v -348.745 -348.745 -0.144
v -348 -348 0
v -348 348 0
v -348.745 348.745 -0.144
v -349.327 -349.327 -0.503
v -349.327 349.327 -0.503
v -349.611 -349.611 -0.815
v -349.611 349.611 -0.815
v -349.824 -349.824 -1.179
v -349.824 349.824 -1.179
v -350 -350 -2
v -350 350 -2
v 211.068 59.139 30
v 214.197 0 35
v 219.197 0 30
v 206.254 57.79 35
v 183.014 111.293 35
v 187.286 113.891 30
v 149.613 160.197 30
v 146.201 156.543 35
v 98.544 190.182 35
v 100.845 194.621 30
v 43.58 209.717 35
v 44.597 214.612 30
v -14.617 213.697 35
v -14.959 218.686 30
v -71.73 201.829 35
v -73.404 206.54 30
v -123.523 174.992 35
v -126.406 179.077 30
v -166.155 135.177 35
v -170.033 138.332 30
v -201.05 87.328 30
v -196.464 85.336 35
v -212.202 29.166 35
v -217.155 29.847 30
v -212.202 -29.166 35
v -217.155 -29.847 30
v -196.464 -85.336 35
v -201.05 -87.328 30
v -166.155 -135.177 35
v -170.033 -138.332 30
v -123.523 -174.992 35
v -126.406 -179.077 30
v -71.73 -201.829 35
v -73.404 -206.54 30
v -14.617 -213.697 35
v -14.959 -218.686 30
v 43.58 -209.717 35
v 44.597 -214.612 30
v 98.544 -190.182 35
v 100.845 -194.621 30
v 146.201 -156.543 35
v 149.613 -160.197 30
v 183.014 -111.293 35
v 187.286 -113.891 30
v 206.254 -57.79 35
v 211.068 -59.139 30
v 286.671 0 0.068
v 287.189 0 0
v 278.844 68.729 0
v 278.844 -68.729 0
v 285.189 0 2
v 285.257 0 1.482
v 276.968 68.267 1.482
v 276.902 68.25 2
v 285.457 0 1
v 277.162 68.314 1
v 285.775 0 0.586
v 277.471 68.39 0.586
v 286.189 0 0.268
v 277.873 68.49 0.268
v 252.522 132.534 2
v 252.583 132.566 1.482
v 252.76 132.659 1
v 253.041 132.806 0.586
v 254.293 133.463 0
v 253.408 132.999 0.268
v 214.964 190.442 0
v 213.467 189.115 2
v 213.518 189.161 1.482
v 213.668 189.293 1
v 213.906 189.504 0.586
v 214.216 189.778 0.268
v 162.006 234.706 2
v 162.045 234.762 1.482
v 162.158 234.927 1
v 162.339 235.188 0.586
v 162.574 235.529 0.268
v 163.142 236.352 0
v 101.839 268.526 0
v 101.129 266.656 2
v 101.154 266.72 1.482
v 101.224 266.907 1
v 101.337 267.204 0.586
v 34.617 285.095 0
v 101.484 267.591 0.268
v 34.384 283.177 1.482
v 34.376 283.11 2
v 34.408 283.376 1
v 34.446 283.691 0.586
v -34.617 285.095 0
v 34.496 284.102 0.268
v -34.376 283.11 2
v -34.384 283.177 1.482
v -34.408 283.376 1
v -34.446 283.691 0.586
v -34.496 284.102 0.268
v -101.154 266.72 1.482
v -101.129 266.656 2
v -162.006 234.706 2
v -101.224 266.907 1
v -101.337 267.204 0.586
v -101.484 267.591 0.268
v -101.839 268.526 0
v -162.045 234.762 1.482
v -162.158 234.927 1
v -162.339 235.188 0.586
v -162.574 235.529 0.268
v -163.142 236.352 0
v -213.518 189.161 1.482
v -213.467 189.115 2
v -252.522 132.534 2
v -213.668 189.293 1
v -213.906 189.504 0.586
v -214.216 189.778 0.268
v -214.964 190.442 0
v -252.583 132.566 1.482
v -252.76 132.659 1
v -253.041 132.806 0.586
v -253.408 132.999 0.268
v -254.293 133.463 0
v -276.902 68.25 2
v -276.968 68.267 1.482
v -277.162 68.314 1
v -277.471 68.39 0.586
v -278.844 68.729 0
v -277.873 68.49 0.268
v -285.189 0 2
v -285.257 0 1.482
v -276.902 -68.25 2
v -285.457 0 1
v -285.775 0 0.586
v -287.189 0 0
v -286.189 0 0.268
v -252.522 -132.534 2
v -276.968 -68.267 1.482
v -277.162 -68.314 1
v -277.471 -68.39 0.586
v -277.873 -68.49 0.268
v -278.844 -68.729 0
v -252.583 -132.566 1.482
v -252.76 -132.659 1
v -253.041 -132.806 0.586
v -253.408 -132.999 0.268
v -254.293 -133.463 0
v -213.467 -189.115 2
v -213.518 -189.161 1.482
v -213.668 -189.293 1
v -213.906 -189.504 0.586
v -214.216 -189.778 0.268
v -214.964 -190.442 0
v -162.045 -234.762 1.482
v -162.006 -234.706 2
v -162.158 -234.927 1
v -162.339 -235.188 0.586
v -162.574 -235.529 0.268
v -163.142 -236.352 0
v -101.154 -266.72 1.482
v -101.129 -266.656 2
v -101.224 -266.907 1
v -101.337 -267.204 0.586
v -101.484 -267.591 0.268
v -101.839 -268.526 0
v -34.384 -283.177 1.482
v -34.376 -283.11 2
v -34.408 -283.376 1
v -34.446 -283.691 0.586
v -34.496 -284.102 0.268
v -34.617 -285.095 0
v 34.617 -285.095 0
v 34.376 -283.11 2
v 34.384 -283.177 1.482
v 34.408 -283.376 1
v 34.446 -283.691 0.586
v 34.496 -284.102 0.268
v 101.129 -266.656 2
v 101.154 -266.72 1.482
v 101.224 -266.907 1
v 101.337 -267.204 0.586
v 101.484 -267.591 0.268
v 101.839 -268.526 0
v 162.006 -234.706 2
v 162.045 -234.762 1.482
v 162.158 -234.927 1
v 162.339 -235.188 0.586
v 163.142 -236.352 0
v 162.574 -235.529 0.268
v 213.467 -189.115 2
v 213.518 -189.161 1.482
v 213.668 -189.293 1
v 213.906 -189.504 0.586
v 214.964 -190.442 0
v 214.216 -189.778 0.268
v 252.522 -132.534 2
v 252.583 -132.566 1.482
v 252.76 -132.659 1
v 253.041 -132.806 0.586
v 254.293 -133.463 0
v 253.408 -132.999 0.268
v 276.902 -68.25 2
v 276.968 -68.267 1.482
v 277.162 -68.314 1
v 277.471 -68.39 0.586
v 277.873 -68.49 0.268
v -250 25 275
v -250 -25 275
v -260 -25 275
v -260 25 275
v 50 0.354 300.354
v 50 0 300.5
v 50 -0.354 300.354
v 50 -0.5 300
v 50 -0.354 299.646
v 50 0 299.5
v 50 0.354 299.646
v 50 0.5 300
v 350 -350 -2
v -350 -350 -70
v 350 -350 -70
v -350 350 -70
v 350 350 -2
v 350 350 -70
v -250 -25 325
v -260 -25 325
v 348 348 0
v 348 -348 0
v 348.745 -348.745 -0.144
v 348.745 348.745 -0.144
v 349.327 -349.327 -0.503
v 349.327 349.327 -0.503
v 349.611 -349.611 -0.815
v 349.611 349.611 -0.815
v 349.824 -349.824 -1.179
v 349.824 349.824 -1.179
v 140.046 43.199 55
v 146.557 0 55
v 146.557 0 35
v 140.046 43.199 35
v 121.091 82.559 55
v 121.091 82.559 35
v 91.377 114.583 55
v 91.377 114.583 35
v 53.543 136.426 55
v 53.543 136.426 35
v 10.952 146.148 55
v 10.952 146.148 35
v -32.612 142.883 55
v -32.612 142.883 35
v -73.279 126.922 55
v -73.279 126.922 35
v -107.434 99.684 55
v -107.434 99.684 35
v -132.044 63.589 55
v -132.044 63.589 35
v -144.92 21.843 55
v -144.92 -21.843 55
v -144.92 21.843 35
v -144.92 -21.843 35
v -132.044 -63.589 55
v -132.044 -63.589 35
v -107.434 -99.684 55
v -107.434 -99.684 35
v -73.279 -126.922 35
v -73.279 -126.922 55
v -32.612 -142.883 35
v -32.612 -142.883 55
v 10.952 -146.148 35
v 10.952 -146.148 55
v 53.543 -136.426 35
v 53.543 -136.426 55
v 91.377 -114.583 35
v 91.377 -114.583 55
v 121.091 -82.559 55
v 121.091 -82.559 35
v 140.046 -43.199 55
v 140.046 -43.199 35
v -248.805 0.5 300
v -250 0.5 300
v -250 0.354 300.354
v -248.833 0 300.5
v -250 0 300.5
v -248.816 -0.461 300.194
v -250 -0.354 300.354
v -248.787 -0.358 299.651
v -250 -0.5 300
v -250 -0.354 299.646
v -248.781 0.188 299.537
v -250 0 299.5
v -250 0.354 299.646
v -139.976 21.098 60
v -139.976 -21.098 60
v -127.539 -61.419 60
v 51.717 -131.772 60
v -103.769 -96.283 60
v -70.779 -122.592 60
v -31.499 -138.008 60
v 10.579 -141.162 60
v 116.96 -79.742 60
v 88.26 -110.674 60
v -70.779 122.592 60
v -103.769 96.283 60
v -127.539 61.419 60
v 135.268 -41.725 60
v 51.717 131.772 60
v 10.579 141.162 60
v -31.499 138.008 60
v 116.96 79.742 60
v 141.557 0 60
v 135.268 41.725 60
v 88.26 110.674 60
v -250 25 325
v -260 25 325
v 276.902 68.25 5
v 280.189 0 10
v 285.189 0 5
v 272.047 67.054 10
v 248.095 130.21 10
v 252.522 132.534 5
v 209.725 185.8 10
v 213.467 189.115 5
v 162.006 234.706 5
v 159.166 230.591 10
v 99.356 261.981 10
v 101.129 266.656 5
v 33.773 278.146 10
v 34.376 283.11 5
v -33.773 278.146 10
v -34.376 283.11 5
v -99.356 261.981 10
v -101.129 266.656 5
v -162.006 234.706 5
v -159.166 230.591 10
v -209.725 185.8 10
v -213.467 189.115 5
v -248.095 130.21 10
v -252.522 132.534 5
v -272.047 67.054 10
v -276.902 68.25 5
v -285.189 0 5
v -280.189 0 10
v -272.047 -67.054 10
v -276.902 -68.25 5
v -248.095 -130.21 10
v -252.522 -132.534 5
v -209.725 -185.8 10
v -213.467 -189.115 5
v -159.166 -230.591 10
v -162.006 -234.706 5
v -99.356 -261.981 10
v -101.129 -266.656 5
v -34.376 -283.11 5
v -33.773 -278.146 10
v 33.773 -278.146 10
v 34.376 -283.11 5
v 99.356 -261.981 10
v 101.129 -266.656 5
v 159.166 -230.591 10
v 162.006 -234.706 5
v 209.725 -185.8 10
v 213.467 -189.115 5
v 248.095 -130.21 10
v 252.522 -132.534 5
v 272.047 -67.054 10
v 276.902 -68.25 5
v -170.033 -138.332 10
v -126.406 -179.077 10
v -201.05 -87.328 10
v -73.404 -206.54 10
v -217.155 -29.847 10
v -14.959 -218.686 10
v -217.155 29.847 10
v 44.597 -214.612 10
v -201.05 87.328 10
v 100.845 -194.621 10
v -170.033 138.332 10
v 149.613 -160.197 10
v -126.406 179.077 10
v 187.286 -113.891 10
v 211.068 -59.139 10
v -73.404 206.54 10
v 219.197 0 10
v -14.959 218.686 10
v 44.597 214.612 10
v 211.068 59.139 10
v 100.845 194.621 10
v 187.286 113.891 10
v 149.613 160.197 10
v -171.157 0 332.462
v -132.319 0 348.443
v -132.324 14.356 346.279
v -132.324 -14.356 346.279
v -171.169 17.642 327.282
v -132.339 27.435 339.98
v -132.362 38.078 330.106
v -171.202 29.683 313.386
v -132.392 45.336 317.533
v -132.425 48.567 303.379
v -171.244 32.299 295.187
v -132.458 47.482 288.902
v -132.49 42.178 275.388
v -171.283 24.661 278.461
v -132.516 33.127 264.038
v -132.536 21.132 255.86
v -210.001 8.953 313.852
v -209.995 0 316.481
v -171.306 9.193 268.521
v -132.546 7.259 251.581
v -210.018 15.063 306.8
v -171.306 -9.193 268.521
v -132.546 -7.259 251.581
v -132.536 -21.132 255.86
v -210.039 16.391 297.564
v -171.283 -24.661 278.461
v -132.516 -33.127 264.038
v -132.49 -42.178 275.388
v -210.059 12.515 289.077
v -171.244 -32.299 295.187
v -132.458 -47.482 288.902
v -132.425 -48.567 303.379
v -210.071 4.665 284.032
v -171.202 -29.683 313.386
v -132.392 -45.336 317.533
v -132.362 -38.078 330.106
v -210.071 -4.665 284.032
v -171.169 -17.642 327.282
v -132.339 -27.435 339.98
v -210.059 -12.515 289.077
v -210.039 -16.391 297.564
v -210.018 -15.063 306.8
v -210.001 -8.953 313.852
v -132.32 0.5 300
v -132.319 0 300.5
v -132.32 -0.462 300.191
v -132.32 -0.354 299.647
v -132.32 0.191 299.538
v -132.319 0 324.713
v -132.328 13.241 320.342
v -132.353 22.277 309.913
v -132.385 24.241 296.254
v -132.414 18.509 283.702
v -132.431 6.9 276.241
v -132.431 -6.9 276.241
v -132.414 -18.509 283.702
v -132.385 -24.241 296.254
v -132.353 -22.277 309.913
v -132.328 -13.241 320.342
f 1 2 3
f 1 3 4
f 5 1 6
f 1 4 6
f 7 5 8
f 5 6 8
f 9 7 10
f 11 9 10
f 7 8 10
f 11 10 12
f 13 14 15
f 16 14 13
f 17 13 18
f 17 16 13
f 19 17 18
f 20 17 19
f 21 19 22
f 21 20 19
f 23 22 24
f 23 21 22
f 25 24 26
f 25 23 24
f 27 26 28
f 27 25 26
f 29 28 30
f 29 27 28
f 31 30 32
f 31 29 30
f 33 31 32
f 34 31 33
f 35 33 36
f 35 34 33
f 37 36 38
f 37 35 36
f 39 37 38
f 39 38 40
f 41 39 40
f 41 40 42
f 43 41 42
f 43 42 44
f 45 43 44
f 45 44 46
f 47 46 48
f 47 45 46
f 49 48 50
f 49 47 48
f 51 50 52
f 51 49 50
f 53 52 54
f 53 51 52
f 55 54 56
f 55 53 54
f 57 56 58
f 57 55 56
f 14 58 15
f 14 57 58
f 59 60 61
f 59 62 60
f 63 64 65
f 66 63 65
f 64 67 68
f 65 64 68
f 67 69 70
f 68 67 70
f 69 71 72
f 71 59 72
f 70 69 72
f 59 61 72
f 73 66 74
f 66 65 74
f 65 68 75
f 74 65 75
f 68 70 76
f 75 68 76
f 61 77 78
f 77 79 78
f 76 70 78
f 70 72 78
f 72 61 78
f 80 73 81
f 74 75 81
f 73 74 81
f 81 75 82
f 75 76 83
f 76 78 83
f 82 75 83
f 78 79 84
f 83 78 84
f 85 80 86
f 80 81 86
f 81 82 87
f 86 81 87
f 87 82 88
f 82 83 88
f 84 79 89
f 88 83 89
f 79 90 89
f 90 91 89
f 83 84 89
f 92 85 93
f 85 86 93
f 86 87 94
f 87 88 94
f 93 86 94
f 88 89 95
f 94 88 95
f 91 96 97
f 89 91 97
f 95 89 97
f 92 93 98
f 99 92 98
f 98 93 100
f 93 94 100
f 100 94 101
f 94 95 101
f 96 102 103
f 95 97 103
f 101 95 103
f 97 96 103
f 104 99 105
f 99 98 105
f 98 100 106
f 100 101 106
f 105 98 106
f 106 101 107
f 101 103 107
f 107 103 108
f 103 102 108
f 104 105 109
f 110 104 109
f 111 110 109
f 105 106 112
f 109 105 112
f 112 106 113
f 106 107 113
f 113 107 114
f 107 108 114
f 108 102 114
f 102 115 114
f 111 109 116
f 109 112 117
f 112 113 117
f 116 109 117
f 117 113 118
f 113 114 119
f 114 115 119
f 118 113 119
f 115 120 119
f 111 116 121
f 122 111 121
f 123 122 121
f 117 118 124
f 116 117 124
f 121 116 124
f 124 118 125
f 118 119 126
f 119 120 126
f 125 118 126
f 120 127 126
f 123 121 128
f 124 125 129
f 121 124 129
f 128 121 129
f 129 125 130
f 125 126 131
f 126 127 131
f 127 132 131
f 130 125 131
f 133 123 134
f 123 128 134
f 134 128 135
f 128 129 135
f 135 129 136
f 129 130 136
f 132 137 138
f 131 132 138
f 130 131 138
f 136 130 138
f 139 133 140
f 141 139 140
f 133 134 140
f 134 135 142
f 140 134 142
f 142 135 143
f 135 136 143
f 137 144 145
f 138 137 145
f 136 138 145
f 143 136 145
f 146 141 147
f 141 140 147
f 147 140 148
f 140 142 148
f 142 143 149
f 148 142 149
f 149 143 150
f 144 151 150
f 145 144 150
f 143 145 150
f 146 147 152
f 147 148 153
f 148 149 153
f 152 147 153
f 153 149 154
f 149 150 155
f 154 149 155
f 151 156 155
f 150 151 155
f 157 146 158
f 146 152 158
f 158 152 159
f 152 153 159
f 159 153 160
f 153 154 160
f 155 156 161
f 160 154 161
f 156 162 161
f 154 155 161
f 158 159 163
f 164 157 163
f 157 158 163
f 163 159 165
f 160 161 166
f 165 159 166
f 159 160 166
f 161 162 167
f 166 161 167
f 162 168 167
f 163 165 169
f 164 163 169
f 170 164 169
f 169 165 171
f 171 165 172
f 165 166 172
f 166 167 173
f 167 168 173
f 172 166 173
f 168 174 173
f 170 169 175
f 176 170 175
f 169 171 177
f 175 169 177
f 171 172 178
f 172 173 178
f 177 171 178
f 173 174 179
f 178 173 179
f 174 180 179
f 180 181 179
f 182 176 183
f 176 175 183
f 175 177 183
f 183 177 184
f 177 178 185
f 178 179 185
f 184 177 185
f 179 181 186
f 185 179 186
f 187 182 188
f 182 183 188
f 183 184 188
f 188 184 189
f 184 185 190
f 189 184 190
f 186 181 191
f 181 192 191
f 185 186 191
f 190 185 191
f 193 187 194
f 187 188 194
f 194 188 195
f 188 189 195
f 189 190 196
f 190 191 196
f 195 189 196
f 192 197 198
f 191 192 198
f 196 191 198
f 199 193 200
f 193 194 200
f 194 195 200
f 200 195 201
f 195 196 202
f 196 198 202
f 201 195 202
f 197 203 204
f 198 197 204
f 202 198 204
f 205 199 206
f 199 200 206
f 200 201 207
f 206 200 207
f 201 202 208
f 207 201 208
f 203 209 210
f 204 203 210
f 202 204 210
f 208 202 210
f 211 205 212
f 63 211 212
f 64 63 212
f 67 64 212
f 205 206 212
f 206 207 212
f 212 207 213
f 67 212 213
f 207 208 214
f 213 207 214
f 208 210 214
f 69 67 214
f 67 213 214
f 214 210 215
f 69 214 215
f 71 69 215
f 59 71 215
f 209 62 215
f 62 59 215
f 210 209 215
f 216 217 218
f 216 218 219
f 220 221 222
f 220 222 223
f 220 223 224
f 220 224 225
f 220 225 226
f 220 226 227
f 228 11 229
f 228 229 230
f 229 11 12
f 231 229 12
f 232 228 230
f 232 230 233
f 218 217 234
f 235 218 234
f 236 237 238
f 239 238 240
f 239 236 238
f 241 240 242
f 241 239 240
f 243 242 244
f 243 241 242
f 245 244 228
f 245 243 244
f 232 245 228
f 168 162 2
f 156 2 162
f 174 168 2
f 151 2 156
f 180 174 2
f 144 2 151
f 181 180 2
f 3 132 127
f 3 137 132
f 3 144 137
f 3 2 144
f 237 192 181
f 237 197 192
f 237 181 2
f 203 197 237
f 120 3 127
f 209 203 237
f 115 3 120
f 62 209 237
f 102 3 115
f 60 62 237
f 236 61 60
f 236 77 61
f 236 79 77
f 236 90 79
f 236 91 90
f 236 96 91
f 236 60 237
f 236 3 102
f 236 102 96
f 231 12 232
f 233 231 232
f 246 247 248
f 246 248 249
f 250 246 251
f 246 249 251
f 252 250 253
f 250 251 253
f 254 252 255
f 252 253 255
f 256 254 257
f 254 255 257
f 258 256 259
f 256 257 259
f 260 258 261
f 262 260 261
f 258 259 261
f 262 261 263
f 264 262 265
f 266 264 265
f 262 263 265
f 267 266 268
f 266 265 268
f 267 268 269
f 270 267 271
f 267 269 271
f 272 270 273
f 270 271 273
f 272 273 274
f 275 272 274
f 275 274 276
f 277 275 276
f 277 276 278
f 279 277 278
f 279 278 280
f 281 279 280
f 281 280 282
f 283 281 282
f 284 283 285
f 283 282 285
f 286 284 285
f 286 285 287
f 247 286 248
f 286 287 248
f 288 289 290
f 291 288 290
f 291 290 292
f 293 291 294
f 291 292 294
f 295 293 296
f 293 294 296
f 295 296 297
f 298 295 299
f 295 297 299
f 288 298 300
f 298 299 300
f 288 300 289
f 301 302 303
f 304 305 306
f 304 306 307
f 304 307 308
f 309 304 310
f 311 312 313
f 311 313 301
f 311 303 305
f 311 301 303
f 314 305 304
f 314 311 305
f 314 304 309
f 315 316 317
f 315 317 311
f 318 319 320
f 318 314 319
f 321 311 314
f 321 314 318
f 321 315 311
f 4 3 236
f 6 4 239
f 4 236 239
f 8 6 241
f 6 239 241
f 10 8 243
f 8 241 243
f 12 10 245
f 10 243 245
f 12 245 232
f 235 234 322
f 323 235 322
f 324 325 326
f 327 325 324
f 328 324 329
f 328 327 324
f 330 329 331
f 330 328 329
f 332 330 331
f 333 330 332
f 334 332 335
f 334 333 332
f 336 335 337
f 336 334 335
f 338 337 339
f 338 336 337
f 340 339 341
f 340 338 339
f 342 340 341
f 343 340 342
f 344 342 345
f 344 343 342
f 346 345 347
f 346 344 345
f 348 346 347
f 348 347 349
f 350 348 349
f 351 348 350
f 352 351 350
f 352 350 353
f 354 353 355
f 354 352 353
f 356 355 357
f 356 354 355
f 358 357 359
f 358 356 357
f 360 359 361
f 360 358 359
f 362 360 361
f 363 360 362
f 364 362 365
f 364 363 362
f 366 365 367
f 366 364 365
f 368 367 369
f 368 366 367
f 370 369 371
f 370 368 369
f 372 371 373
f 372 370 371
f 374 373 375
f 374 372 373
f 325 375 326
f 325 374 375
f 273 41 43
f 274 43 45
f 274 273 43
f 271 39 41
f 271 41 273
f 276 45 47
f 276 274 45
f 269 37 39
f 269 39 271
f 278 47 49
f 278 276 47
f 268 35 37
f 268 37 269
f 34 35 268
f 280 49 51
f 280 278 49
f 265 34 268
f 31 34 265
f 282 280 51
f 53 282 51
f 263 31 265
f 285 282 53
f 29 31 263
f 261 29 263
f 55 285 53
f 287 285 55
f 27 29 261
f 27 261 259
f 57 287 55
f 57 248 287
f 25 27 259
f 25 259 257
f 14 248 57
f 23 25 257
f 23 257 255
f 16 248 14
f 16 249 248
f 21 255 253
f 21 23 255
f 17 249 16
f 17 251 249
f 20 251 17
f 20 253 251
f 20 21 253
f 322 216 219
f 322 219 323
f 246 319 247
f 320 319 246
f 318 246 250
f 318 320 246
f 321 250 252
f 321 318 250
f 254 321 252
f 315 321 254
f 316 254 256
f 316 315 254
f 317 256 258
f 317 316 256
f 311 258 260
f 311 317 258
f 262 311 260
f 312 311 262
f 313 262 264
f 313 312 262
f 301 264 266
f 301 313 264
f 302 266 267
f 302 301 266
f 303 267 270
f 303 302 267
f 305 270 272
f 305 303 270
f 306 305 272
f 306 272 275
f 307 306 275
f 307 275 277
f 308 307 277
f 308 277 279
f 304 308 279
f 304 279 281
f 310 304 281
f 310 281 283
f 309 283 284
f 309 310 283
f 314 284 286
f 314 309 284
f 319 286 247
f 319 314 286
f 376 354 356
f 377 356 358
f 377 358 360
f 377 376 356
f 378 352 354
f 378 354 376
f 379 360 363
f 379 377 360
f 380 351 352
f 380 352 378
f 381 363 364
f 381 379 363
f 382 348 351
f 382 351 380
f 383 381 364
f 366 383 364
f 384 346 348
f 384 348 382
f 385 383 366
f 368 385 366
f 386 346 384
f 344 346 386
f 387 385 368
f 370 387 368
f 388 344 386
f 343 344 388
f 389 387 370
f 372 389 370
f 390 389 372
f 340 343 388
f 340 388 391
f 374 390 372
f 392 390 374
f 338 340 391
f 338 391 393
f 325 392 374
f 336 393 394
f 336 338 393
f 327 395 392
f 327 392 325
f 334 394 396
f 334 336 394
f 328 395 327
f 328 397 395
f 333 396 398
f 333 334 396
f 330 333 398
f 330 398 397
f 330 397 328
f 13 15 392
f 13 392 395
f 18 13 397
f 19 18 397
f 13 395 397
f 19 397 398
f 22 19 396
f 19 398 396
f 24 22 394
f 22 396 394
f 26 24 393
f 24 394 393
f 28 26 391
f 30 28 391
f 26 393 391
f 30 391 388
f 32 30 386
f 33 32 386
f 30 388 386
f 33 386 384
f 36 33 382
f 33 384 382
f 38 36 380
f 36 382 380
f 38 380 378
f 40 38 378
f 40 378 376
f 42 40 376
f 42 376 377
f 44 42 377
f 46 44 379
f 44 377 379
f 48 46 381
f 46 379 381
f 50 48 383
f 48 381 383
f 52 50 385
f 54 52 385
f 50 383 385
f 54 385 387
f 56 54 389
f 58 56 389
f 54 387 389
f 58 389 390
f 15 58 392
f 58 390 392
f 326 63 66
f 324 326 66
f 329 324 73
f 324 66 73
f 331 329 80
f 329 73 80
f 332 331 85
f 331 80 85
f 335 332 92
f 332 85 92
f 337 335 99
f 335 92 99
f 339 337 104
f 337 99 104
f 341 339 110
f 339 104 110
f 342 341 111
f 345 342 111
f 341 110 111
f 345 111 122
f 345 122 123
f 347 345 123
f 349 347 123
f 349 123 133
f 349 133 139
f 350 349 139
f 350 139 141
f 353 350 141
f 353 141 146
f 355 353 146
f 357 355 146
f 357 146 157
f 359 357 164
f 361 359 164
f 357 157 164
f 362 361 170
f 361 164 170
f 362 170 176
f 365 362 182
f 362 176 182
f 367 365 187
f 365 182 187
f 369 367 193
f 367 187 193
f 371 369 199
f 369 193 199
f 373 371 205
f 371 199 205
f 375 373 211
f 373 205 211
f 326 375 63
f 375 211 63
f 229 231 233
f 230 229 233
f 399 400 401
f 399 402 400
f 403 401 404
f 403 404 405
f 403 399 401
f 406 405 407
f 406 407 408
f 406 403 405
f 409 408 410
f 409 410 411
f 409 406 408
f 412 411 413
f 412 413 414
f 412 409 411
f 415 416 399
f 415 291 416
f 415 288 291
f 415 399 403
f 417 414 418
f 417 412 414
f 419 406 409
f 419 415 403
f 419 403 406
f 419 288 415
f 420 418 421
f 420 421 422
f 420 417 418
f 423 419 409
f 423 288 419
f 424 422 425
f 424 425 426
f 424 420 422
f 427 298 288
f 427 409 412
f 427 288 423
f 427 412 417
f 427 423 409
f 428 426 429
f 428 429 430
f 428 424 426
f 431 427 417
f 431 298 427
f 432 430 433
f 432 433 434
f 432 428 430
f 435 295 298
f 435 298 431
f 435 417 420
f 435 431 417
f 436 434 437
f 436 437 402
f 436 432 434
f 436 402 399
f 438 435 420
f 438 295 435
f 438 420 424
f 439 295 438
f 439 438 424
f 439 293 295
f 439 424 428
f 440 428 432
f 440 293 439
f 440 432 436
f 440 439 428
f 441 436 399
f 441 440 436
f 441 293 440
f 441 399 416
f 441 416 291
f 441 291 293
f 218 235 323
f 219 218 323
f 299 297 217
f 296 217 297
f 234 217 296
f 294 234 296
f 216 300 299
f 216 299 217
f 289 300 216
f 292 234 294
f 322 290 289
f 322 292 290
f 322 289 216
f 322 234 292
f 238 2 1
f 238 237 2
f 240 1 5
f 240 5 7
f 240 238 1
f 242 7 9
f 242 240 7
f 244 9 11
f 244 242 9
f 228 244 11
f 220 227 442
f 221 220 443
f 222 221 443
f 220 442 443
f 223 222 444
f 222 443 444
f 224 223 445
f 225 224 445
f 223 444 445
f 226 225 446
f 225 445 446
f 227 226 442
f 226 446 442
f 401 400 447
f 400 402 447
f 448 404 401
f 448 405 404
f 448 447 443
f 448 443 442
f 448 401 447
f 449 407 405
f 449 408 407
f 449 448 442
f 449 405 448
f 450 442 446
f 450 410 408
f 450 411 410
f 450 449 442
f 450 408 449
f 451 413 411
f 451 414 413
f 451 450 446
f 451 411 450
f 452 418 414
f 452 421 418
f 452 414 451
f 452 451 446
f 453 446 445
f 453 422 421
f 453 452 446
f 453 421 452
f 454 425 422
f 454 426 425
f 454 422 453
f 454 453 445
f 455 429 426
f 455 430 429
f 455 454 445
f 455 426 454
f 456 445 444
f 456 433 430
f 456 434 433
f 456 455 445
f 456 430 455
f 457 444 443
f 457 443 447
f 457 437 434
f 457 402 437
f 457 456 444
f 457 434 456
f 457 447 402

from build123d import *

# Parameters (mm, degrees)
F0_W      = 700
F0_H      = 700
F1_DEPTH  = 70
F2_R      = 285.1890902305
F3_DEPTH  = 10
F4_R      = 219.196638876
F5_DEPTH  = 25
F6_R      = 146.5573641712
F7_DEPTH  = 25
F9_W      = 50
F9_H      = 50
F10_DEPTH = 10
F11_R     = 0.5
F12_DEPTH = 300
F13_SIZE  = 5
F14_R     = 2


with BuildPart() as f1:
    # F0 (on Top) → F1 (new body)
    with BuildSketch(Plane.XY):
        Rectangle(F0_W, F0_H)
    extrude(amount=-F1_DEPTH)

    # F2 (on face) → F3 (join)
    with BuildSketch(Plane.XY):
        Circle(F2_R)
    extrude(amount=F3_DEPTH)

    # F4 (on face) → F5 (join)
    with BuildSketch(Plane.XY.offset(10)):
        Circle(F4_R)
    extrude(amount=F5_DEPTH)

    # F6 (on face) → F7 (join)
    with BuildSketch(Plane.XY.offset(35)):
        Circle(F6_R)
    extrude(amount=F7_DEPTH)

    # F13
    f13_edges = [f1.edges().sort_by_distance(p)[0] for p in [
        (-146.557364, 0, 60),
        (-219.196639, 0, 35),
        (-285.18909, 0, 10),
    ]]
    chamfer(f13_edges, length=F13_SIZE)

    # F14
    f14_edges = [f1.edges().sort_by_distance(p)[0] for p in [
        (0, -350, 0),
        (0, 350, 0),
        (350, 0, 0),
        (-350, 0, 0),
        (-285.18909, 0, 0),
    ]]
    fillet(f14_edges, radius=F14_R)


with BuildPart() as f10:
    # F9 (on offset) → F10 (new body)
    with BuildSketch(Plane.YZ.offset(-250)):
        with Locations((0, 300)):
            Rectangle(F9_W, F9_H)
    extrude(amount=-F10_DEPTH)

    # F11 (on face) → F12 (join)
    with BuildSketch(Plane.YZ.offset(-250)):
        with Locations((0, 300)):
            Circle(F11_R)
    extrude(amount=F12_DEPTH)

    # F15 (on Front) → F16 (revolve)
    with BuildSketch(Plane.XZ):
        Polygon((-132.3193562107, 348.4428985053), (-250.0126063824, 300.0144958496), (-132.3193562107, 299.7396098097), align=None)
    revolve(axis=Axis((-191.1659812966, 0, 299.8770528296), (-0.9999972725, 0, 0.0023356079)))


solid = Compound([f1.part, f10.part])
